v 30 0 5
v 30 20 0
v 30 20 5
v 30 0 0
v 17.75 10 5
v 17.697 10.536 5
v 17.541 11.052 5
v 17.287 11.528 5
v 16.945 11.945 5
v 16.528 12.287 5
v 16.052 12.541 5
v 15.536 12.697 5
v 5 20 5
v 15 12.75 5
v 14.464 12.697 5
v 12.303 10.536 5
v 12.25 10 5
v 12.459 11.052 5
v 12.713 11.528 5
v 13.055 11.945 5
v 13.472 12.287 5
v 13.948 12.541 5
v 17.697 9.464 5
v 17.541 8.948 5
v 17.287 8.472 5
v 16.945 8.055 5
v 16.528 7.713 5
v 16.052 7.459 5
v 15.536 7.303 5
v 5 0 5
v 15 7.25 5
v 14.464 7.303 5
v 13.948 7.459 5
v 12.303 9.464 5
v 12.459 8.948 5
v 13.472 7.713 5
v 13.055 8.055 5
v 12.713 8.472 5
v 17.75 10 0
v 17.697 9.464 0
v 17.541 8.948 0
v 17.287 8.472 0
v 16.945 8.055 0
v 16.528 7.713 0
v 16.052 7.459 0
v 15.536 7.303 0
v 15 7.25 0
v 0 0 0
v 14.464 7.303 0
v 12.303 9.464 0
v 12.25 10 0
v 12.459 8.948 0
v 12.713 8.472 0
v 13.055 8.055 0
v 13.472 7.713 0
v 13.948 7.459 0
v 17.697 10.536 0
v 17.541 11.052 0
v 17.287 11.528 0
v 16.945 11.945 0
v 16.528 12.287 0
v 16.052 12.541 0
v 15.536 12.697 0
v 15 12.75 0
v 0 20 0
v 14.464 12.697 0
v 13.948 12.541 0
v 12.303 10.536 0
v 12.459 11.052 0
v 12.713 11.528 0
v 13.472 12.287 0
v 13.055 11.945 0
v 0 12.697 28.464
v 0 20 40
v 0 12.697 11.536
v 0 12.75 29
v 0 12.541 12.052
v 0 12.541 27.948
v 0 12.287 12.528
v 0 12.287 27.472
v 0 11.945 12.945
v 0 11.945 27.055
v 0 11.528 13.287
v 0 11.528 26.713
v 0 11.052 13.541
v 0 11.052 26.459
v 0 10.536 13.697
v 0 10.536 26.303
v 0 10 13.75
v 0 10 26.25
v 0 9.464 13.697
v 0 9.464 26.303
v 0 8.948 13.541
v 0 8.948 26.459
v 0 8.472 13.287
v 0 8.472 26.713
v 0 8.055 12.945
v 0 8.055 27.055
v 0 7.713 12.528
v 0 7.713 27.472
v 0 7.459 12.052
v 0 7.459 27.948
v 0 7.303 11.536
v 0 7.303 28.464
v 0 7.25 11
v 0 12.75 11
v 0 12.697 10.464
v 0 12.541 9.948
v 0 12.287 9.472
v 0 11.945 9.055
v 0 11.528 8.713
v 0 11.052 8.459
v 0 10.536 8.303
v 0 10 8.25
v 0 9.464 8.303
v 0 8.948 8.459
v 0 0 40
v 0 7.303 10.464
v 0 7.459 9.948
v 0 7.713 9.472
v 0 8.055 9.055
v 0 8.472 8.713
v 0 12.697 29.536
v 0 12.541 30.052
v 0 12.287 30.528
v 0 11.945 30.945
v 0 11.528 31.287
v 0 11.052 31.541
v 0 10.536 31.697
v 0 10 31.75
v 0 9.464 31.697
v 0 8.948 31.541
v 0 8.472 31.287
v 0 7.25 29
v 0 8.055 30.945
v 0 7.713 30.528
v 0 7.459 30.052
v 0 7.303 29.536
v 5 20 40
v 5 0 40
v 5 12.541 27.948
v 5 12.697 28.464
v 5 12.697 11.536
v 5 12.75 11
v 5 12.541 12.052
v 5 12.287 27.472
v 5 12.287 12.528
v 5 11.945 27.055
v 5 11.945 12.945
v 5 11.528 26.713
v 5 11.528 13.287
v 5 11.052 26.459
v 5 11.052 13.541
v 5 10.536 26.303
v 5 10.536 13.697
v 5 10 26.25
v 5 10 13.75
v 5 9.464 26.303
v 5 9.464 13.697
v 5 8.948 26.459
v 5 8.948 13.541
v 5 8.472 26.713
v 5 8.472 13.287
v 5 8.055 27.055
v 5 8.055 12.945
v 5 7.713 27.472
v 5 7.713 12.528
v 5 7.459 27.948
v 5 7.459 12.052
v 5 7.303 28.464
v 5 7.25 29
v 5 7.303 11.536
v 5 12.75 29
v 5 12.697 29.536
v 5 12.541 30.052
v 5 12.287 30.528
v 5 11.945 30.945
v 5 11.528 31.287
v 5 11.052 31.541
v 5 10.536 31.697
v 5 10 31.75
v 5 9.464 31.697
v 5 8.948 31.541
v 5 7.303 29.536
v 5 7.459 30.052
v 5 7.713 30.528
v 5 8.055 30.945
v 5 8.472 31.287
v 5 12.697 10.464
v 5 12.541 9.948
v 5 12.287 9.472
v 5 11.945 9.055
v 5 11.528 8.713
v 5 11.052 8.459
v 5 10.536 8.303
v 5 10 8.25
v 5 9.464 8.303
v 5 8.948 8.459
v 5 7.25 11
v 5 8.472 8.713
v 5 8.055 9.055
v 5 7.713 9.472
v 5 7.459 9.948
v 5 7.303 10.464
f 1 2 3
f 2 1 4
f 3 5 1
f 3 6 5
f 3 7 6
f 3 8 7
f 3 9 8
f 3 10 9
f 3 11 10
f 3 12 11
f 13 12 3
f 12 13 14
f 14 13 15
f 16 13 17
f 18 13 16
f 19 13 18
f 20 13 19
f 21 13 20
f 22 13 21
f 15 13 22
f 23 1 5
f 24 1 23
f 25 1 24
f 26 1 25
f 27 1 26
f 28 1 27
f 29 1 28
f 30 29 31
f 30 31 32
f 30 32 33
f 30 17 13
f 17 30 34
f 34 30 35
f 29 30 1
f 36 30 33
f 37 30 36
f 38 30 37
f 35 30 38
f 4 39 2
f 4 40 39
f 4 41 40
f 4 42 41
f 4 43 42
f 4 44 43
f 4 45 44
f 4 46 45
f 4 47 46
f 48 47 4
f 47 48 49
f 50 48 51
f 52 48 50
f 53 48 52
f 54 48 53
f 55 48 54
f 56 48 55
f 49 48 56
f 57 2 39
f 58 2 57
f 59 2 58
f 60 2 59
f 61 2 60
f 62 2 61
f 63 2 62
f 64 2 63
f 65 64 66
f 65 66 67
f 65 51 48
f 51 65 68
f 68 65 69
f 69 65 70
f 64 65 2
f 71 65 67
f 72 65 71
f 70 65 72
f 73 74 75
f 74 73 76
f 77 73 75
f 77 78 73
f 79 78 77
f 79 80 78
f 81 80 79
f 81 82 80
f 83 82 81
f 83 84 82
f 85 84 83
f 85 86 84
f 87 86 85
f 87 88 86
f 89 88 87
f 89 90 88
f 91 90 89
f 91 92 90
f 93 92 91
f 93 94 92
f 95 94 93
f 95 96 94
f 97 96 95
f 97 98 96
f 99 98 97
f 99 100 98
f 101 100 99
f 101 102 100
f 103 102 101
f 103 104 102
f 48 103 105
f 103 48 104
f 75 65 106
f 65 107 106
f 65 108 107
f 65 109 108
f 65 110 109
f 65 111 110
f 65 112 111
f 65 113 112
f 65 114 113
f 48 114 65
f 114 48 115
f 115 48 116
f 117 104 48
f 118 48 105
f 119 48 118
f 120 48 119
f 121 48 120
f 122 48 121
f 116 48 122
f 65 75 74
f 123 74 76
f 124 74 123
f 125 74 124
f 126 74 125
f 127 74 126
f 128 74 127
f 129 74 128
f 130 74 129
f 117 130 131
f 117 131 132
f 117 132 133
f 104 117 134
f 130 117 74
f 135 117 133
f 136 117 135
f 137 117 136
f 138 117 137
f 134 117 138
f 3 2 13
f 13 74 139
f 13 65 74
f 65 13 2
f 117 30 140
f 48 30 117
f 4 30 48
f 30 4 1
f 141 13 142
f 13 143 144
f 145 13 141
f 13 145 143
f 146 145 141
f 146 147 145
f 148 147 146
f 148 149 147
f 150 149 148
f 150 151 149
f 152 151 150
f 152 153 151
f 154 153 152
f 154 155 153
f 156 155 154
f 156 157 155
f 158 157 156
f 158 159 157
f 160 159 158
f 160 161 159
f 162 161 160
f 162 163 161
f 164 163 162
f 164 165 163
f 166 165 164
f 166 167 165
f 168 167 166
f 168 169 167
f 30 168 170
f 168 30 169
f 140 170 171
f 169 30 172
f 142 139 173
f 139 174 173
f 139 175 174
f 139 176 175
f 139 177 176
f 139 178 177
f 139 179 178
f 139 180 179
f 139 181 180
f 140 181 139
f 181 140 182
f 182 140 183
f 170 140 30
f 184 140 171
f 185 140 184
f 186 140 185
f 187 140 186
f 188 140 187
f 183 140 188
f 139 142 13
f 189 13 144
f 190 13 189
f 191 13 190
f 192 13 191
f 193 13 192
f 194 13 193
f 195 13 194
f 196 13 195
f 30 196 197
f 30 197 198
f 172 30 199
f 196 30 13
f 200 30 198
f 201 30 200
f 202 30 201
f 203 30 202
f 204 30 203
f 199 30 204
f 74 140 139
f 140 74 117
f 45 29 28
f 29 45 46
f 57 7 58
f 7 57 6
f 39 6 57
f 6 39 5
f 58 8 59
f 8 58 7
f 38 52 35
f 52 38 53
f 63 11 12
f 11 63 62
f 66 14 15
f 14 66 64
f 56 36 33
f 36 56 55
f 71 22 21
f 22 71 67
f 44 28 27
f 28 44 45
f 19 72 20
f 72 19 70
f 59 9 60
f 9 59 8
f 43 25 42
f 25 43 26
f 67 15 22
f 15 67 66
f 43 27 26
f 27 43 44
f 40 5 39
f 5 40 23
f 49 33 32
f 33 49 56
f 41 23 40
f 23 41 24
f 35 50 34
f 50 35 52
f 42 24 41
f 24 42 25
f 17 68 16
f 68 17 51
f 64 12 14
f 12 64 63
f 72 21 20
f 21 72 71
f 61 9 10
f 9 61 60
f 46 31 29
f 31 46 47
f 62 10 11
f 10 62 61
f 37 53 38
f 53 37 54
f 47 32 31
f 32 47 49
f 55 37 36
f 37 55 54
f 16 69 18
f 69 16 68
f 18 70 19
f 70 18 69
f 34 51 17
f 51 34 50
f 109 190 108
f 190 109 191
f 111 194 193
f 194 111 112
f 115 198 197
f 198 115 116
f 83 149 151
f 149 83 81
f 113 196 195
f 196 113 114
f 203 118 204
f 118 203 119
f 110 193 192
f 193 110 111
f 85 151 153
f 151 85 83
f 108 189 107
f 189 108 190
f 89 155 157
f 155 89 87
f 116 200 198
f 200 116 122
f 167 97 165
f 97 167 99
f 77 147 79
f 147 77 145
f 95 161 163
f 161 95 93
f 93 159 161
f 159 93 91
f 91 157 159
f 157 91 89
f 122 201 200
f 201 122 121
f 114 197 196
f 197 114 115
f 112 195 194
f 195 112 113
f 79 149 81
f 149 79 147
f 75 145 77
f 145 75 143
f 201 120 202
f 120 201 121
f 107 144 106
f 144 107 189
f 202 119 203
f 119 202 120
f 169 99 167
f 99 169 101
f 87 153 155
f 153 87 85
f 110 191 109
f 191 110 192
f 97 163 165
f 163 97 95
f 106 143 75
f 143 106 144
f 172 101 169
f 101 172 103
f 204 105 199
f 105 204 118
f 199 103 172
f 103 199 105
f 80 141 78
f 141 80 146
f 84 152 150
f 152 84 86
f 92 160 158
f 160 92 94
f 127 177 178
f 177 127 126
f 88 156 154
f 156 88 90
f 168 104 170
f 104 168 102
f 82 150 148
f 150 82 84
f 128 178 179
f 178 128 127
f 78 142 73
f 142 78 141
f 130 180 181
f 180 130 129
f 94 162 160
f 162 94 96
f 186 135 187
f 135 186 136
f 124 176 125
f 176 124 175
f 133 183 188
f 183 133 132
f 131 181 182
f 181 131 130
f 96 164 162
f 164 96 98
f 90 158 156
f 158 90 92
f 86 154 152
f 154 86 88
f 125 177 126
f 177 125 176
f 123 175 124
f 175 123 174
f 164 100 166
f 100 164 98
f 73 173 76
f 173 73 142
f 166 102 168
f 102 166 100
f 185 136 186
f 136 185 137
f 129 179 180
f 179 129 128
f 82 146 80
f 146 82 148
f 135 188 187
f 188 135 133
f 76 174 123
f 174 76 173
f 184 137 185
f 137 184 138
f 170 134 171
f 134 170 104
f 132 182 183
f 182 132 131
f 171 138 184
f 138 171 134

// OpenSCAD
$fn = 32;

// ----------------------------------------------------------------------
// L-bracket: 30 x 20 x 40 mm
// ----------------------------------------------------------------------

// --- parameters (mm) ---
base_len = 30;            // horizontal leg, X
upright_h = 40;           // vertical leg, Z
flange_w = 20;            // bracket depth, Y
mat_t = 5;                // plate thickness
hole_d = 5.5;             // clearance for M5

module hole_z(px, py) {
  translate([px, py, -0.5]) cylinder(h = mat_t + 1, d = hole_d);
}
module hole_x(pz, py) {
  translate([-0.5, py, pz]) rotate([0, 90, 0]) cylinder(h = mat_t + 1, d = hole_d);
}

difference() {
  union() {
    /* horizontal leg */
    cube([base_len, flange_w, mat_t]);
    /* vertical leg, overlapping the corner block */
    cube([mat_t, flange_w, upright_h]);
  }
  hole_z(15, 10);
  hole_x(11, 10);
  hole_x(29, 10);
}
